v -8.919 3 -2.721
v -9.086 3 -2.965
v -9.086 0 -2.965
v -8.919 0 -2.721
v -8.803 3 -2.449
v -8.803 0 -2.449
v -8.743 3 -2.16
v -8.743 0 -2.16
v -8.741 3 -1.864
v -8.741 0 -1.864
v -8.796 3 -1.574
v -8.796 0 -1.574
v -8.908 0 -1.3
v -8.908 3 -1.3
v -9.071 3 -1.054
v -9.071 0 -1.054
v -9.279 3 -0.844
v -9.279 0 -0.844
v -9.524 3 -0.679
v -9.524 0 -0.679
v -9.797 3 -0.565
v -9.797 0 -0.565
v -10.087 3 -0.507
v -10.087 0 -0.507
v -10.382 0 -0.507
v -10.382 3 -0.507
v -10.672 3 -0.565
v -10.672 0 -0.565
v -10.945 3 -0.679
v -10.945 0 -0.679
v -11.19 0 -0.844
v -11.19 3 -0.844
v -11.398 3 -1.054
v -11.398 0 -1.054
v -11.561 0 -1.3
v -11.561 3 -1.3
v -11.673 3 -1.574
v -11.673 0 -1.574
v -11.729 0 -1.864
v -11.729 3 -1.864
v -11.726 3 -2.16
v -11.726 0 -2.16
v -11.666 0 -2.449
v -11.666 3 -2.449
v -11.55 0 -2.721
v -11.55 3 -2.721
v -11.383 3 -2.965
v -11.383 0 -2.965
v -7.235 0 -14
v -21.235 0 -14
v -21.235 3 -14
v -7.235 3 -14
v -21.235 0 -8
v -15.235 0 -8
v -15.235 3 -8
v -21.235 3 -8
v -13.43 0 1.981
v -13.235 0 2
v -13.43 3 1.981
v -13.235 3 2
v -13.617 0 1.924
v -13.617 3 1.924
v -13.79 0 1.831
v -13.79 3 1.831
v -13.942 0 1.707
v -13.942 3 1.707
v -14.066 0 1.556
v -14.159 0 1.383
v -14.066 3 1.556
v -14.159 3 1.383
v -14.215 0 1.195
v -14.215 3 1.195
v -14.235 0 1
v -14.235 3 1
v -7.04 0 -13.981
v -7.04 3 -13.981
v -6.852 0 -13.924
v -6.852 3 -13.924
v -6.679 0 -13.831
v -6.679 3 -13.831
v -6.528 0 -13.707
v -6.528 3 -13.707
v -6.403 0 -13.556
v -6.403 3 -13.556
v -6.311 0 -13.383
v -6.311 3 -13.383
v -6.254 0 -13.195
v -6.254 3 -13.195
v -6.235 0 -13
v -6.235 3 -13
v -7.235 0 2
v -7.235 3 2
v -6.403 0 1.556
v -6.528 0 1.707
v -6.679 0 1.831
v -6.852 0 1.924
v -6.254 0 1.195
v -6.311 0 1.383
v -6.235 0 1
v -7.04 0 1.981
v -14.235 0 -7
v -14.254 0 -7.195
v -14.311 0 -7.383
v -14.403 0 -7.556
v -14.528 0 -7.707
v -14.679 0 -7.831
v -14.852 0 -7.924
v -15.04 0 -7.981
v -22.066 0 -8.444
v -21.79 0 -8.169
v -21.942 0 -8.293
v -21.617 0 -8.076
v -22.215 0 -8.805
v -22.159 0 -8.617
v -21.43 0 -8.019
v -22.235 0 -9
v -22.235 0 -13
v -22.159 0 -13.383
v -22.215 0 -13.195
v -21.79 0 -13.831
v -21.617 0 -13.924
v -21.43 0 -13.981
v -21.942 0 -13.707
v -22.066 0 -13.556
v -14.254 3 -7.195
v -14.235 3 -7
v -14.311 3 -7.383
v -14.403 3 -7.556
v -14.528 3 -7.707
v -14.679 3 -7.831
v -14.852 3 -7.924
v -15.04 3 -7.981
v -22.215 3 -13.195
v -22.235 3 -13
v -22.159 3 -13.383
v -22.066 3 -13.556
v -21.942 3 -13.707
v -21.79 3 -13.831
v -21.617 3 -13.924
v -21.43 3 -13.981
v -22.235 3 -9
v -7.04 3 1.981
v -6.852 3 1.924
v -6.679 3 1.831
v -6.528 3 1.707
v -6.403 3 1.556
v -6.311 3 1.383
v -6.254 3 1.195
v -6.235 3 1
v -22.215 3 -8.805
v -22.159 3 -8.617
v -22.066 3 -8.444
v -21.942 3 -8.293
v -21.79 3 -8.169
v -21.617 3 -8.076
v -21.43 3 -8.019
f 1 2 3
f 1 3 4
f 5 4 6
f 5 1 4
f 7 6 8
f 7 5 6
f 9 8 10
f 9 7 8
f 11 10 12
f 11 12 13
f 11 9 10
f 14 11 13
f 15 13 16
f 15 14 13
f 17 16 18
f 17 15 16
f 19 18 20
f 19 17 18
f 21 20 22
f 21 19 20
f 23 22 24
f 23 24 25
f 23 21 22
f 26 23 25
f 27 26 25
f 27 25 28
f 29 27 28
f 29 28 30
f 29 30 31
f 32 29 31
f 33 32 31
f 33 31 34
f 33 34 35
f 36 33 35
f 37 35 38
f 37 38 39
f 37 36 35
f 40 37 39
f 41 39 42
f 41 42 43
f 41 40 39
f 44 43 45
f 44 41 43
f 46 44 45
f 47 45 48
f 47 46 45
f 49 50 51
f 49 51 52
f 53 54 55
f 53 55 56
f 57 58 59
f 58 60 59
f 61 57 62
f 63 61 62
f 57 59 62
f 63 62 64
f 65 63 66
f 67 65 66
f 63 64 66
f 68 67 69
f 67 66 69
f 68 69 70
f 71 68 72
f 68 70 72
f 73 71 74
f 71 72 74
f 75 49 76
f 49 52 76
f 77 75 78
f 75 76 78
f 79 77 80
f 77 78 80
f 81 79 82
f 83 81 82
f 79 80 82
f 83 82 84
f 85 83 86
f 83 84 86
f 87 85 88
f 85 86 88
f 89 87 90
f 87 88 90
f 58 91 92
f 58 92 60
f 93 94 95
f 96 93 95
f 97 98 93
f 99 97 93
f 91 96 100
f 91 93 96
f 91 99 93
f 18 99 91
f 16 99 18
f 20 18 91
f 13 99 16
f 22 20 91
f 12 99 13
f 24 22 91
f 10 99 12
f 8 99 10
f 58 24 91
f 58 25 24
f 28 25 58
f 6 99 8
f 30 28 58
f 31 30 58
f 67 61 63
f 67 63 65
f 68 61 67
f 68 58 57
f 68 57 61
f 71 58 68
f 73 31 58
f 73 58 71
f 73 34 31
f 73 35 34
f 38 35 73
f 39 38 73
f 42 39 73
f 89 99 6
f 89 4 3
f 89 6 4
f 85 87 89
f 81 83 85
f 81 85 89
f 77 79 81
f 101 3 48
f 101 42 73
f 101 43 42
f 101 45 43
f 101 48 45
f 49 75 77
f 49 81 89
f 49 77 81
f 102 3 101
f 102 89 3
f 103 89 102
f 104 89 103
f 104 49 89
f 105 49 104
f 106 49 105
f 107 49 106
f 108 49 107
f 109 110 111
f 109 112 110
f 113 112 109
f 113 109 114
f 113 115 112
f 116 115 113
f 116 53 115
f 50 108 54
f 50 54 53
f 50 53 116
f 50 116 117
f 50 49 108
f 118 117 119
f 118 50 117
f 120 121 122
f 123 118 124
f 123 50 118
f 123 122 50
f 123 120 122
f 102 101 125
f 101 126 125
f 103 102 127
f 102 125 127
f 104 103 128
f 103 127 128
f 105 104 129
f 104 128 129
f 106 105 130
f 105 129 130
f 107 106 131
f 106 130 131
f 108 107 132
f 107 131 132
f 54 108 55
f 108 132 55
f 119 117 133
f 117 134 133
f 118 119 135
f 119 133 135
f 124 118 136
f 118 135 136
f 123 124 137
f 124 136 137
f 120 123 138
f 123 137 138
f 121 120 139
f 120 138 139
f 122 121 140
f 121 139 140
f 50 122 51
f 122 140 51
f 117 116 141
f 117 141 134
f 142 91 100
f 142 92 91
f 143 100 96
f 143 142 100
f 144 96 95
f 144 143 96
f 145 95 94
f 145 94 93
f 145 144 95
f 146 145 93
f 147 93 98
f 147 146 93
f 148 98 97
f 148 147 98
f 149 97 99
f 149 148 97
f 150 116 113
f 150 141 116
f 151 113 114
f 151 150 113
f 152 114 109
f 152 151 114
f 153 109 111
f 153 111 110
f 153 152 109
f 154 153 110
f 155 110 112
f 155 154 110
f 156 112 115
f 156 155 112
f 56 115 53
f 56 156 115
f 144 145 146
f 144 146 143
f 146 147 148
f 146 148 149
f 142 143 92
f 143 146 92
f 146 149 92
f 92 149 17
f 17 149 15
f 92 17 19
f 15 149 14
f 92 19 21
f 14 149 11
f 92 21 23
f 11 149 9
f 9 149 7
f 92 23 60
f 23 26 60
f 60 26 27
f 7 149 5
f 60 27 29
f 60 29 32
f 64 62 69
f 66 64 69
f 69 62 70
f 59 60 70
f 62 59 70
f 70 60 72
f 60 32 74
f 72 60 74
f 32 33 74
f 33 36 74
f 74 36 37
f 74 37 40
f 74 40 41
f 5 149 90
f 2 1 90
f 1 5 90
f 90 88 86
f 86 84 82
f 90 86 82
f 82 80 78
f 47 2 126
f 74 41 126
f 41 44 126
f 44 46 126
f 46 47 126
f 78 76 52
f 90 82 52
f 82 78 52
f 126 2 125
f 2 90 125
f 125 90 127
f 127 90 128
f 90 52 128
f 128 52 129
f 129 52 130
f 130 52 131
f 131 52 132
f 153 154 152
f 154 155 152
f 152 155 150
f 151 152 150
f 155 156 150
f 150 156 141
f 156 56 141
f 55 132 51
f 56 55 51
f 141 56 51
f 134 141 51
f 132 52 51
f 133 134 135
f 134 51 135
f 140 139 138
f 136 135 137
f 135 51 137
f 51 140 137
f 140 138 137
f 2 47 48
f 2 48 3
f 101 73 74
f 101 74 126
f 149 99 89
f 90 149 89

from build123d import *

# Parameters (mm, degrees)
BOSS_EXTRUDE2_DEPTH = 3
FILLET1_R           = 1
FILLET2_R           = 1
FILLET3_R           = 1
FILLET4_R           = 1
FILLET5_R           = 1
FILLET6_R           = 1
CUT_EXTRUDE2_DEPTH  = 3


with BuildPart() as part:
    # Sketch1 → Boss-Extrude2 (new body)
    with BuildSketch(Plane(origin=(0, 0, 0), x_dir=(1, 0, 0), z_dir=(0, 1, 0))):
        Polygon((-6.234693371, -2), (-14.234693371, -2), (-14.234693371, 8), (-22.234693371, 8), (-22.234693371, 14), (-6.234693371, 14), (-6.234693371, 8), align=None)
    extrude(amount=BOSS_EXTRUDE2_DEPTH)

    # Fillet1
    fillet1_edges = [part.edges().sort_by_distance(p)[0] for p in [
        (-22.234693371, 1.5, -14),
    ]]
    fillet(fillet1_edges, radius=FILLET1_R)

    # Fillet2
    fillet2_edges = [part.edges().sort_by_distance(p)[0] for p in [
        (-22.234693371, 1.5, -8),
    ]]
    fillet(fillet2_edges, radius=FILLET2_R)

    # Fillet3
    fillet3_edges = [part.edges().sort_by_distance(p)[0] for p in [
        (-6.234693371, 1.5, -14),
    ]]
    fillet(fillet3_edges, radius=FILLET3_R)

    # Fillet4
    fillet4_edges = [part.edges().sort_by_distance(p)[0] for p in [
        (-14.234693371, 1.5, 2),
    ]]
    fillet(fillet4_edges, radius=FILLET4_R)

    # Fillet5
    fillet5_edges = [part.edges().sort_by_distance(p)[0] for p in [
        (-6.234693371, 1.5, 2),
    ]]
    fillet(fillet5_edges, radius=FILLET5_R)

    # Fillet6
    fillet6_edges = [part.edges().sort_by_distance(p)[0] for p in [
        (-14.234693371, 1.5, -8),
    ]]
    fillet(fillet6_edges, radius=FILLET6_R)

    # Sketch3 → Cut-Extrude2 (cut)
    with BuildSketch(Plane(origin=(0, 3, 0), x_dir=(1, 0, 0), z_dir=(0, 1, 0))):
        with BuildLine():
            Line((-11.383221505, 2.964822846), (-9.086165237, 2.964822846))
            ThreePointArc((-9.086165237, 2.964822846), (-10.234693371, 0.5), (-11.383221505, 2.964822846))
        make_face()
    extrude(amount=-CUT_EXTRUDE2_DEPTH, mode=Mode.SUBTRACT)


solid = part.part
